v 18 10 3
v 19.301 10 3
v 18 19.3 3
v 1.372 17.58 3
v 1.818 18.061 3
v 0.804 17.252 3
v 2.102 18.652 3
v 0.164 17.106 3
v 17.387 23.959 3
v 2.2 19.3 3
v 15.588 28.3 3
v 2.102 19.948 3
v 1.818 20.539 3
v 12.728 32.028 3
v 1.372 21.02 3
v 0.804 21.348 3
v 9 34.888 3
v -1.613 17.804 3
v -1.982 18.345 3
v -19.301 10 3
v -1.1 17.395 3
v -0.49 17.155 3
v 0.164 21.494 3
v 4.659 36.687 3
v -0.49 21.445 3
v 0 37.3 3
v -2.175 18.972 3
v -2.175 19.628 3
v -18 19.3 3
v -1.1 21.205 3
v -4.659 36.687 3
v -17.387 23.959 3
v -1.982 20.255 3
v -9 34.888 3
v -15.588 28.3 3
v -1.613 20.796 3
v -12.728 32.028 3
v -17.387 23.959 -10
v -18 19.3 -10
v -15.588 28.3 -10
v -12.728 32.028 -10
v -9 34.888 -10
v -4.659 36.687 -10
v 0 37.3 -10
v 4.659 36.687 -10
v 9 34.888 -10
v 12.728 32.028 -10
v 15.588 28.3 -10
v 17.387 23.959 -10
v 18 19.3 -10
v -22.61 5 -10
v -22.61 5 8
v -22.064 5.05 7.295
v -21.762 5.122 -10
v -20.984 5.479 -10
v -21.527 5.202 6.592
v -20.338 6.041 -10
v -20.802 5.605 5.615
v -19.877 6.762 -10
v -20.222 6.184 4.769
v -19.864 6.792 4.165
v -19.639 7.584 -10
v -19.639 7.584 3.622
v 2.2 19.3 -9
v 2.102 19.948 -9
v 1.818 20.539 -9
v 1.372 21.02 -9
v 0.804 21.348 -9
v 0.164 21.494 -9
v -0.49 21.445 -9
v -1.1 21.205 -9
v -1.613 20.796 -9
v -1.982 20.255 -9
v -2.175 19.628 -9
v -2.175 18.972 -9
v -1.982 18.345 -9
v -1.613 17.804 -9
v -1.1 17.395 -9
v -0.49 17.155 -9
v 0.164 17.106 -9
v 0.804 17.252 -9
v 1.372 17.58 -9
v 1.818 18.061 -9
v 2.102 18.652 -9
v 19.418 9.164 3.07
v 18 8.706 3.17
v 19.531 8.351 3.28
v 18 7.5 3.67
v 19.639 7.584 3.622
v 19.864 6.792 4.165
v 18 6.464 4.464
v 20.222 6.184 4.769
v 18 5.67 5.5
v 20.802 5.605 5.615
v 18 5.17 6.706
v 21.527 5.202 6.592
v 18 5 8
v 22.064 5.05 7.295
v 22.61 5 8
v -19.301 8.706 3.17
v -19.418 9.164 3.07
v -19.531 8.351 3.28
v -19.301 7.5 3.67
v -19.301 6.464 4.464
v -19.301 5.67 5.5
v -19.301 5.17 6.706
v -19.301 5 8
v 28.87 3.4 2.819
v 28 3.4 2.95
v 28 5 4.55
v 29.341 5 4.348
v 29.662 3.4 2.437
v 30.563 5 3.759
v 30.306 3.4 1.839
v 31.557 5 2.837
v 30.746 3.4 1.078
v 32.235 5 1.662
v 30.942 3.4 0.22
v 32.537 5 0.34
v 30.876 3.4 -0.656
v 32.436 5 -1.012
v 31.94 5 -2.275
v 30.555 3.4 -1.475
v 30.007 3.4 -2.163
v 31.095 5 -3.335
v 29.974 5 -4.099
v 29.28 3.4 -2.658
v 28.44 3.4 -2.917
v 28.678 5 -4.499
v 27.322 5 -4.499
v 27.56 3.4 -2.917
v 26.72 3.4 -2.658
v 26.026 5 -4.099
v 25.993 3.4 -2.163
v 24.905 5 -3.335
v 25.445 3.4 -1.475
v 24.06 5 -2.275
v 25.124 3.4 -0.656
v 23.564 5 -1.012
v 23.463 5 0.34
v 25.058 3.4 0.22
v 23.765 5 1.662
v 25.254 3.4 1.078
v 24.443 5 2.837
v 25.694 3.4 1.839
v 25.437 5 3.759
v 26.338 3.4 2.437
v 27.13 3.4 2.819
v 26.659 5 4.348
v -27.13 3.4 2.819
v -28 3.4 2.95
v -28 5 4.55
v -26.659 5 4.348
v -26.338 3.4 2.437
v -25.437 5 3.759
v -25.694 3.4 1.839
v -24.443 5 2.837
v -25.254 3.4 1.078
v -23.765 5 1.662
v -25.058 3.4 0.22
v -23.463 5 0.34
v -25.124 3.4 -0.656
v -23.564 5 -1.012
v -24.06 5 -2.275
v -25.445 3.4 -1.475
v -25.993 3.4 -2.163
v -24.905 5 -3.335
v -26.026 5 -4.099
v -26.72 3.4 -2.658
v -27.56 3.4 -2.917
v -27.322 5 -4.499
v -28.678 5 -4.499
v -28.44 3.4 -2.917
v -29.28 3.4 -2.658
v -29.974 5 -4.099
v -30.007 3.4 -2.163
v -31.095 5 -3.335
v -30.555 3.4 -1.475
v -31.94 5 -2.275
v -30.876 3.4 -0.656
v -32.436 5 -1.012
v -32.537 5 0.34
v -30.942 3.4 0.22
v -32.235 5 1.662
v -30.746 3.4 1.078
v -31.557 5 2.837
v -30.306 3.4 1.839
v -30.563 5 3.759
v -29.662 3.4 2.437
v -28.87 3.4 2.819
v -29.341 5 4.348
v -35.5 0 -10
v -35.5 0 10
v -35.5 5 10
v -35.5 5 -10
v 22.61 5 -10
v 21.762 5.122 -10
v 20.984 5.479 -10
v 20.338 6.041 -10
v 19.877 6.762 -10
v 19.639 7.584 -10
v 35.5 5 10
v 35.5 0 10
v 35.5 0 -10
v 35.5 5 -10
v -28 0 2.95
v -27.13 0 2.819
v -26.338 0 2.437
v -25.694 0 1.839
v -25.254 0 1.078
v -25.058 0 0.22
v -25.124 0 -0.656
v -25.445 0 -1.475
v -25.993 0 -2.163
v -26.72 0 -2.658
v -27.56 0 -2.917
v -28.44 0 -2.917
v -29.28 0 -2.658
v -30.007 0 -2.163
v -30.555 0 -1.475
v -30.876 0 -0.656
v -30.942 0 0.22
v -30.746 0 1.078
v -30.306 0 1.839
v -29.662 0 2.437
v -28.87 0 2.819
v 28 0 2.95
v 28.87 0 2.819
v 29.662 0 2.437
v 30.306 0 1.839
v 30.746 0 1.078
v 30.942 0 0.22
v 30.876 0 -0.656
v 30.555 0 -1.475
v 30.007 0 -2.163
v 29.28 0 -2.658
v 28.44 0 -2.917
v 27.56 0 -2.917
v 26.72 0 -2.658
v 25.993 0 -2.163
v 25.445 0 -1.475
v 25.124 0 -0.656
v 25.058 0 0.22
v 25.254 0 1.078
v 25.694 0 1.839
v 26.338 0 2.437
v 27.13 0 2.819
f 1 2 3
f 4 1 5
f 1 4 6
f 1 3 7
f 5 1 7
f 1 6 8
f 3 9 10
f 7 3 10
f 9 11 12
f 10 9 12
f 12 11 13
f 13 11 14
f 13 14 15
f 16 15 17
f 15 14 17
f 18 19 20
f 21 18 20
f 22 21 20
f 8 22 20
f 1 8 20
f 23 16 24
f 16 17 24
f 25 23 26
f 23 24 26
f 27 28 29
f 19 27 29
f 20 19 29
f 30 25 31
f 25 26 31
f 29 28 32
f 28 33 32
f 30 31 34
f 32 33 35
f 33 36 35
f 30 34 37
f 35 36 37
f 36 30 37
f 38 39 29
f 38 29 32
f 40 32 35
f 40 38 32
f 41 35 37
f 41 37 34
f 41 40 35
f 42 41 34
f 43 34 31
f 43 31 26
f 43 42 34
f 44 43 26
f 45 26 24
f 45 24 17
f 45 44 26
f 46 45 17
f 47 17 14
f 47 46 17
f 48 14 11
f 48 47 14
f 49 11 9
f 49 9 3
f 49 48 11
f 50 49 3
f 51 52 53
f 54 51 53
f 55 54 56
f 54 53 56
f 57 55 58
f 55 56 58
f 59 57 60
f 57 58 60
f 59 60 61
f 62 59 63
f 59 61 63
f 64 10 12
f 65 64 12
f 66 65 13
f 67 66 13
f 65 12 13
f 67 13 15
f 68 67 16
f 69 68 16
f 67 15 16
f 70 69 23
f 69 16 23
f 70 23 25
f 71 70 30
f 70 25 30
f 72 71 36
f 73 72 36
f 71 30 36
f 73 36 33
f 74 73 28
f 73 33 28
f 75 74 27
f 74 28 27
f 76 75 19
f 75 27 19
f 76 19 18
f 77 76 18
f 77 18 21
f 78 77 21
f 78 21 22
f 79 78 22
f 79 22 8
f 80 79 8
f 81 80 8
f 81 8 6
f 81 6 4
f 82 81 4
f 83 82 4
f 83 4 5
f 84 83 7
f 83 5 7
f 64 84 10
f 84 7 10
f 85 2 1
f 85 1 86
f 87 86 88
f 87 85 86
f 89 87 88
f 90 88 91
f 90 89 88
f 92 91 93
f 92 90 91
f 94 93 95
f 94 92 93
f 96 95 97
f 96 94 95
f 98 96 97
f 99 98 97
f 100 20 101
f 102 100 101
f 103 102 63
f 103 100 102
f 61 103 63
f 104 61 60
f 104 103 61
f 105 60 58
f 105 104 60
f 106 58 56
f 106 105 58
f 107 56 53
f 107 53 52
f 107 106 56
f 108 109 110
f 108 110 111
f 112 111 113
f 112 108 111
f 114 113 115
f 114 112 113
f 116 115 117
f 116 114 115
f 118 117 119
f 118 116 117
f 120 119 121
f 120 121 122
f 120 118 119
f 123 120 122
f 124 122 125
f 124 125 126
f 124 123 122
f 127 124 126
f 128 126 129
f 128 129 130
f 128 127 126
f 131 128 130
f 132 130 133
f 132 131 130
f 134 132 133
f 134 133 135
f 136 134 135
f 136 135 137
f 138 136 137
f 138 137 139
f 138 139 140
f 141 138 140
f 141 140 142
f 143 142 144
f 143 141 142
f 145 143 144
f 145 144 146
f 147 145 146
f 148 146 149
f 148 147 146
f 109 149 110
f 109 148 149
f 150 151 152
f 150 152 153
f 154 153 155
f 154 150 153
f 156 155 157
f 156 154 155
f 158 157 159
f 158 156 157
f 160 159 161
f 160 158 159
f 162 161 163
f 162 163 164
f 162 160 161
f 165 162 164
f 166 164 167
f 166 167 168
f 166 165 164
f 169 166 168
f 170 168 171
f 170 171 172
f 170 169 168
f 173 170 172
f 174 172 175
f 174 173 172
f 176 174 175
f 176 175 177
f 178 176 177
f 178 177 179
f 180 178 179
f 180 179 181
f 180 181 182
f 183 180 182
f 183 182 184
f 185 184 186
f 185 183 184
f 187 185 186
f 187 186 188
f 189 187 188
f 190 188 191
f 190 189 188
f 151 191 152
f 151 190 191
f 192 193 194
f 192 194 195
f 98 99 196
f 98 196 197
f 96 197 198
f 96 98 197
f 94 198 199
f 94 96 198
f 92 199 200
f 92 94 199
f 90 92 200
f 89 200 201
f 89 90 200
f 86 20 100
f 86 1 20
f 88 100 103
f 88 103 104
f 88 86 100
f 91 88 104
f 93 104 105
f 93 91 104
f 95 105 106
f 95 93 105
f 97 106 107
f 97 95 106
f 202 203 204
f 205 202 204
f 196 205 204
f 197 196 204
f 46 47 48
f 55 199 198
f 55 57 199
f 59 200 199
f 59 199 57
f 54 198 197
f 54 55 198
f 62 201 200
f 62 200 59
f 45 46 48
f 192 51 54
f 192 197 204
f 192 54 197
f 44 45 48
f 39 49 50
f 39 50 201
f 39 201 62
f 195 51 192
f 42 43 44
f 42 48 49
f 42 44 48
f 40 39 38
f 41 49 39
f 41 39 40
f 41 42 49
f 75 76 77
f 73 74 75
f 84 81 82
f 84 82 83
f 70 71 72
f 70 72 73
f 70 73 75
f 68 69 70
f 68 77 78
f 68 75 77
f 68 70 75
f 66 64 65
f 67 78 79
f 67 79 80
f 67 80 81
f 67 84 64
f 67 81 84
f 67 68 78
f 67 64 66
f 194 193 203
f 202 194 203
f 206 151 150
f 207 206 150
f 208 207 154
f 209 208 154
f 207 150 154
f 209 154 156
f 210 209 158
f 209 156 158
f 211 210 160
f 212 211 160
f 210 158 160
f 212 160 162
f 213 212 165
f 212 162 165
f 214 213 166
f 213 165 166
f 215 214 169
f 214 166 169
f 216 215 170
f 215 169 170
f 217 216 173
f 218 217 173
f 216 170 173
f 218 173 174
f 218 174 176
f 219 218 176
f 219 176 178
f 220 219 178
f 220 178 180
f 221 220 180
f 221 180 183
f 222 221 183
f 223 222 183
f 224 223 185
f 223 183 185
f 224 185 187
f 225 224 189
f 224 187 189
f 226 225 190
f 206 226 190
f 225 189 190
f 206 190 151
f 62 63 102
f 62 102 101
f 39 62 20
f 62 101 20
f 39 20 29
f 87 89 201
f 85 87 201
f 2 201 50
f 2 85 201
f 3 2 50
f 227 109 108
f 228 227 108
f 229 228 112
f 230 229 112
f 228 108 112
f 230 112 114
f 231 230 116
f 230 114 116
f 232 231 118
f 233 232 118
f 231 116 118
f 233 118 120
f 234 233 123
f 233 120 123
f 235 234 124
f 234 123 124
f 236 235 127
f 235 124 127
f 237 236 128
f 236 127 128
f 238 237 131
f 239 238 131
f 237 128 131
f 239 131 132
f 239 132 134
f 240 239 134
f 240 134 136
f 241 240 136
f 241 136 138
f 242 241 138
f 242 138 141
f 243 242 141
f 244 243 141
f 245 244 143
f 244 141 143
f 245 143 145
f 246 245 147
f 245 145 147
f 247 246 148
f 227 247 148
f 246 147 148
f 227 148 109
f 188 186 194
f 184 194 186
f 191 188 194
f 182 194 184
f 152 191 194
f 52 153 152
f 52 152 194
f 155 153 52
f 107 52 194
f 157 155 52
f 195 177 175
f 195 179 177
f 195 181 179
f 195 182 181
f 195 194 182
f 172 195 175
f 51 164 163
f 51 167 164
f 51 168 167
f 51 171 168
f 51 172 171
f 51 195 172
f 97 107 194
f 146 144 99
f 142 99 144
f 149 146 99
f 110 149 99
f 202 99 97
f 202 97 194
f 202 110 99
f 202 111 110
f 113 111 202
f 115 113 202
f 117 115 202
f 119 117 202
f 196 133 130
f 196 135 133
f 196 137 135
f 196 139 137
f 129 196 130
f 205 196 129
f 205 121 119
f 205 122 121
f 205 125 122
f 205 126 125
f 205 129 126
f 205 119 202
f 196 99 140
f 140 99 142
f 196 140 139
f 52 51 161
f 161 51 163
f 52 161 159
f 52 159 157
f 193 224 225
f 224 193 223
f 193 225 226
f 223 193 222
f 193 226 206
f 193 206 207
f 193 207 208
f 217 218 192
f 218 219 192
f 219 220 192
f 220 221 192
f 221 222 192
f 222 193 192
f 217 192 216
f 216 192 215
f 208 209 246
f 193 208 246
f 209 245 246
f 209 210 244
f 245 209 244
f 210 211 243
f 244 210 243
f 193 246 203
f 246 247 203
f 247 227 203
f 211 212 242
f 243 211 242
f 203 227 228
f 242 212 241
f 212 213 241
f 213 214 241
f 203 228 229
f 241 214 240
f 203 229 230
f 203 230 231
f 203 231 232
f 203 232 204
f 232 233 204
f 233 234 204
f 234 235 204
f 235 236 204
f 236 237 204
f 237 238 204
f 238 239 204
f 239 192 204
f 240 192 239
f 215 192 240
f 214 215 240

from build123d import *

# Parameters (mm, degrees)
SKETCH1_W           = 71
SKETCH1_H           = 20
BOSS_EXTRUDE1_DEPTH = 5
SKETCH2_R           = 2.95
CUT_EXTRUDE1_DEPTH  = 5
CHAMFER1_SIZE       = 1.6
SKETCH3_W           = 36
SKETCH3_H           = 13
BOSS_EXTRUDE2_DEPTH = 14.3
BOSS_EXTRUDE3_DEPTH = 13
CHAMFER2_START      = -20.499775095
CHAMFER2_OUTLINE_W  = 14.439182802
CHAMFER2_OUTLINE_H  = 13
CHAMFER2_DEPTH      = 2.499775095
CHAMFER3_START      = 18
CHAMFER3_OUTLINE_W  = 14.439182802
CHAMFER3_OUTLINE_H  = 13
CHAMFER3_DEPTH      = 2.499775095
SKETCH6_R           = 2.2
CUT_EXTRUDE2_DEPTH  = 12
FILLET2_R           = 3
FILLET3_R           = 5


with BuildPart() as part:
    # Sketch1 → Boss-Extrude1 (new body)
    with BuildSketch(Plane(origin=(0, 0, 0), x_dir=(1, 0, 0), z_dir=(0, 1, 0))):
        Rectangle(SKETCH1_W, SKETCH1_H)
    extrude(amount=BOSS_EXTRUDE1_DEPTH)

    # Sketch2 → Cut-Extrude1 (cut)
    with BuildSketch(Plane(origin=(0, 5, 0), x_dir=(1, 0, 0), z_dir=(0, 1, 0))):
        with Locations(Location((28, 0, 0), (0, 0, 270))):
            Circle(SKETCH2_R)
        with Locations(Location((-28, 0, 0), (0, 0, 270))):
            Circle(SKETCH2_R)
    extrude(amount=-CUT_EXTRUDE1_DEPTH, mode=Mode.SUBTRACT)

    # Chamfer1
    chamfer1_edges = [part.edges().sort_by_distance(p)[0] for p in [
        (28, 5, -2.95),
        (-28, 5, -2.95),
    ]]
    chamfer(chamfer1_edges, length=CHAMFER1_SIZE)

    # Sketch3 → Boss-Extrude2 (add)
    with BuildSketch(Plane(origin=(0, 5, 0), x_dir=(1, 0, 0), z_dir=(0, 1, 0))):
        with Locations((0, 3.5)):
            Rectangle(SKETCH3_W, SKETCH3_H)
    extrude(amount=BOSS_EXTRUDE2_DEPTH)

    # Sketch5 → Boss-Extrude3 (add)
    with BuildSketch(Plane(origin=(0, 0, -10), x_dir=(-1, 0, 0), z_dir=(0, 0, -1))):
        with BuildLine():
            Line((-18, 19.3), (18, 19.3))
            ThreePointArc((18, 19.3), (0, 37.3), (-18, 19.3))
        make_face()
    extrude(amount=-BOSS_EXTRUDE3_DEPTH)

    # Chamfer2: read off the stored shape, not the designer's step
    # Chamfer2 outline → Chamfer2 (add)
    with BuildSketch(Plane(origin=(0, 0, 0), x_dir=(0.13851199388326604, 0.9903607562653531, 0), z_dir=(0.9903607562653531, -0.13851199388326602, 0)).offset(CHAMFER2_START)):
        with Locations((9.401155305, -3.5)):
            Rectangle(CHAMFER2_OUTLINE_W, CHAMFER2_OUTLINE_H)
    extrude(amount=CHAMFER2_DEPTH)

    # Chamfer3: read off the stored shape, not the designer's step
    # Chamfer3 outline → Chamfer3 (add)
    with BuildSketch(Plane(origin=(0, 0, 0), x_dir=(-0.13851199388326604, 0.9903607562653531, 0), z_dir=(0.9903607562653531, 0.13851199388326602, 0)).offset(CHAMFER3_START)):
        with Locations((9.401155305, -3.5)):
            Rectangle(CHAMFER3_OUTLINE_W, CHAMFER3_OUTLINE_H)
    extrude(amount=CHAMFER3_DEPTH)

    # Sketch6 → Cut-Extrude2 (cut)
    with BuildSketch(Plane.XY.offset(3)):
        with Locations((0, 19.3)):
            Circle(SKETCH6_R)
    extrude(amount=-CUT_EXTRUDE2_DEPTH, mode=Mode.SUBTRACT)

    # Fillet2
    fillet2_edges = [part.edges().sort_by_distance(p)[0] for p in [
        (-20, 5, -3.5),
        (20, 5, -3.5),
    ]]
    fillet(fillet2_edges, radius=FILLET2_R)

    # Fillet3
    fillet3_edges = [part.edges().sort_by_distance(p)[0] for p in [
        (-1, 5, 3),
    ]]
    fillet(fillet3_edges, radius=FILLET3_R)


solid = part.part
